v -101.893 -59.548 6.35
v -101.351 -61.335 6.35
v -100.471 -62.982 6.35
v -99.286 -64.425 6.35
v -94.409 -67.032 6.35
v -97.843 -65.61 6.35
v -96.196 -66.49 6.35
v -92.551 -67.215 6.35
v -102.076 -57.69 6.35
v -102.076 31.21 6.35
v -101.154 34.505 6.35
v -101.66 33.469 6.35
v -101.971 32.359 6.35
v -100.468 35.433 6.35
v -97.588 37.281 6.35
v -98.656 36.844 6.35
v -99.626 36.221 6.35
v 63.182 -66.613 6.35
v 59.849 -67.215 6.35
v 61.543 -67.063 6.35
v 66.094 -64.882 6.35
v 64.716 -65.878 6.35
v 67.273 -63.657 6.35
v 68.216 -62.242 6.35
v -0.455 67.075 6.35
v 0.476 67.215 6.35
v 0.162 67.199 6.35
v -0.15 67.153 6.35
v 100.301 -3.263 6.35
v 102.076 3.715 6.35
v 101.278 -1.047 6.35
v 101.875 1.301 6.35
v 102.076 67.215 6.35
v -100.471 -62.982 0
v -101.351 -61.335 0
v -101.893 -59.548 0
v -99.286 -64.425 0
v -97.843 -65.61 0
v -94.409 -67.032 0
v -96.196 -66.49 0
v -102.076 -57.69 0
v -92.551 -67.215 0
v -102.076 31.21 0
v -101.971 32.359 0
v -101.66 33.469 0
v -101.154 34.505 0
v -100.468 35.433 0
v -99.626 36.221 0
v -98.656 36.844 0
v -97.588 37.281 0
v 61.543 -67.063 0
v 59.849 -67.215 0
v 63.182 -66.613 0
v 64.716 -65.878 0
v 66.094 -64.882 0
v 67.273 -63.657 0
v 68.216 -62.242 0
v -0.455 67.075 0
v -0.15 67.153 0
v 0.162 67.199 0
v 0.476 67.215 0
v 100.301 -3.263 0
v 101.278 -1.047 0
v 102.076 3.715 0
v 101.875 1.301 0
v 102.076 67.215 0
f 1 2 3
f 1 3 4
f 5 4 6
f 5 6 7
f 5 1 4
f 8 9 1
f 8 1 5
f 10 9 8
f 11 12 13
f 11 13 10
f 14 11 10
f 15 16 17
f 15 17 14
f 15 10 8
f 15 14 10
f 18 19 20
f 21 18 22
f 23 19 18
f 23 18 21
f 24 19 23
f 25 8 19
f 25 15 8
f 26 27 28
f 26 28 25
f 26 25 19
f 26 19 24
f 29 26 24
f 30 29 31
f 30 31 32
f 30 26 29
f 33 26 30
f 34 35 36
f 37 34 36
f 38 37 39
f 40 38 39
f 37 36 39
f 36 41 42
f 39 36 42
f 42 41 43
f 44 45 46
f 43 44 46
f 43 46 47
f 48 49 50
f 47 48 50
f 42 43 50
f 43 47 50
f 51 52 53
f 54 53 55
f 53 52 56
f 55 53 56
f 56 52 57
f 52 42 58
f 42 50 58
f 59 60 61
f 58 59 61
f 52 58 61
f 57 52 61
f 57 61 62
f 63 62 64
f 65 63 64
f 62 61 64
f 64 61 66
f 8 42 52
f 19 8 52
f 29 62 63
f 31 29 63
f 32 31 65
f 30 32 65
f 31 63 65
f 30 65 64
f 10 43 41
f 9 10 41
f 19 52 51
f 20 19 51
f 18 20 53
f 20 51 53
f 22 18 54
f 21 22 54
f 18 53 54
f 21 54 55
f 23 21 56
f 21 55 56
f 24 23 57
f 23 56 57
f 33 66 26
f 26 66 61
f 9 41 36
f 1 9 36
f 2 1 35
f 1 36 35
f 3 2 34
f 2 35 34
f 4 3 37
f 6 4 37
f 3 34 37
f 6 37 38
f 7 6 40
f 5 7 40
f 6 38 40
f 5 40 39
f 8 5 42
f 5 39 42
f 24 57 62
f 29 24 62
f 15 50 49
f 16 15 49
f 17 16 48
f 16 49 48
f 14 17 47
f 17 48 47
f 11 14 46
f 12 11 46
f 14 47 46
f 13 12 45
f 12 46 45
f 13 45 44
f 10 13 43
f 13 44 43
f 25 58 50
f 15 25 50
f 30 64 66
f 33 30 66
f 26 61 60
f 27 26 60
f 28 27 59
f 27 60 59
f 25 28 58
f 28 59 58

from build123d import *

# Parameters (mm, degrees)
F1_DEPTH = 6.35


with BuildPart() as f1:
    # F0 (on Top) → F1 (new body)
    with BuildSketch(Plane.XY):
        with BuildLine():
            Line((102.076006, 3.715036), (102.076006, 67.215036))
            Line((102.076006, 67.215036), (0.476006, 67.215036))
            ThreePointArc((0.476006, 67.215036), (0.005261, 67.179945), (-0.455078, 67.075446))
            Line((-0.455078, 67.075446), (-97.588172, 37.280782))
            ThreePointArc((-97.588172, 37.280782), (-100.83224, 34.984731), (-102.076006, 31.209964))
            Line((-102.076006, 31.209964), (-102.076006, -57.690036))
            ThreePointArc((-102.076006, -57.690036), (-99.286198, -64.425229), (-92.551006, -67.215036))
            Line((-92.551006, -67.215036), (59.848994, -67.215036))
            ThreePointArc((59.848994, -67.215036), (64.715738, -65.877858), (68.216035, -62.241767))
            Line((68.216035, -62.241767), (100.300694, -3.263398))
            ThreePointArc((100.300694, -3.263398), (101.62522, 0.11468), (102.076006, 3.715036))
        make_face()
    extrude(amount=F1_DEPTH)


solid = f1.part
